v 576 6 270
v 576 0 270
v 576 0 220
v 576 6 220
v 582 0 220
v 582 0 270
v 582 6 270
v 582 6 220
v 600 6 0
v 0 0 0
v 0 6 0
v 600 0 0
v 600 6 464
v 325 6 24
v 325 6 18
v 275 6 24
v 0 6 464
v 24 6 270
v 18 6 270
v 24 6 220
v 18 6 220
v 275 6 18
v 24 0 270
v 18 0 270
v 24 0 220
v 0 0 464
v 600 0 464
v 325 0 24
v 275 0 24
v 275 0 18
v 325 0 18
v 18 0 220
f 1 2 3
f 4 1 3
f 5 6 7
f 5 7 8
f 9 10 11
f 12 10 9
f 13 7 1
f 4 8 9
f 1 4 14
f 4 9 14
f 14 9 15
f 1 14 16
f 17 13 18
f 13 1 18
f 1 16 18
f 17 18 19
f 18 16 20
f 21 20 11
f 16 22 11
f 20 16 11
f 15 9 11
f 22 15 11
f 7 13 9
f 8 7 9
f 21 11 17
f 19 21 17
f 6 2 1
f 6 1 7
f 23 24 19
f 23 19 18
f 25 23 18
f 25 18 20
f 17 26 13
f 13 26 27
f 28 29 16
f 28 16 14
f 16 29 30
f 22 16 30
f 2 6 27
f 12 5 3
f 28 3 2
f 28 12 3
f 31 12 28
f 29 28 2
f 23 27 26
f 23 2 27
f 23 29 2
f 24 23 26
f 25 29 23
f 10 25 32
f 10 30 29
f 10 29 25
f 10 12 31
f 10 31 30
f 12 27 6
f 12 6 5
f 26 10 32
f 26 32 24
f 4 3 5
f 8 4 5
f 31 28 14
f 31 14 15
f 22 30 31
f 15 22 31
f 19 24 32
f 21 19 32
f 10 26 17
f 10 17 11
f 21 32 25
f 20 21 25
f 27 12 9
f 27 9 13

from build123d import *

# Parameters (mm, degrees)
SKETCH1_W           = 50
SKETCH1_H           = 6
SKETCH1_W_2         = 6
SKETCH1_H_2         = 50
BOSS_EXTRUDE1_DEPTH = 6


with BuildPart() as part:
    # Sketch1 → Boss-Extrude1 (new body)
    with BuildSketch(Plane(origin=(0, 0, 0), x_dir=(1, 0, 0), z_dir=(0, 1, 0))):
        Polygon((0, 0), (600, 0), (600, -464), (307, -464), (257, -464), (0, -464), align=None)
        with Locations((300, -21)):
            Rectangle(SKETCH1_W, SKETCH1_H, mode=Mode.SUBTRACT)
        with Locations((579, -245)):
            Rectangle(SKETCH1_W_2, SKETCH1_H_2, mode=Mode.SUBTRACT)
        with Locations((21, -245)):
            Rectangle(SKETCH1_W_2, SKETCH1_H_2, mode=Mode.SUBTRACT)
    extrude(amount=BOSS_EXTRUDE1_DEPTH)


solid = part.part
